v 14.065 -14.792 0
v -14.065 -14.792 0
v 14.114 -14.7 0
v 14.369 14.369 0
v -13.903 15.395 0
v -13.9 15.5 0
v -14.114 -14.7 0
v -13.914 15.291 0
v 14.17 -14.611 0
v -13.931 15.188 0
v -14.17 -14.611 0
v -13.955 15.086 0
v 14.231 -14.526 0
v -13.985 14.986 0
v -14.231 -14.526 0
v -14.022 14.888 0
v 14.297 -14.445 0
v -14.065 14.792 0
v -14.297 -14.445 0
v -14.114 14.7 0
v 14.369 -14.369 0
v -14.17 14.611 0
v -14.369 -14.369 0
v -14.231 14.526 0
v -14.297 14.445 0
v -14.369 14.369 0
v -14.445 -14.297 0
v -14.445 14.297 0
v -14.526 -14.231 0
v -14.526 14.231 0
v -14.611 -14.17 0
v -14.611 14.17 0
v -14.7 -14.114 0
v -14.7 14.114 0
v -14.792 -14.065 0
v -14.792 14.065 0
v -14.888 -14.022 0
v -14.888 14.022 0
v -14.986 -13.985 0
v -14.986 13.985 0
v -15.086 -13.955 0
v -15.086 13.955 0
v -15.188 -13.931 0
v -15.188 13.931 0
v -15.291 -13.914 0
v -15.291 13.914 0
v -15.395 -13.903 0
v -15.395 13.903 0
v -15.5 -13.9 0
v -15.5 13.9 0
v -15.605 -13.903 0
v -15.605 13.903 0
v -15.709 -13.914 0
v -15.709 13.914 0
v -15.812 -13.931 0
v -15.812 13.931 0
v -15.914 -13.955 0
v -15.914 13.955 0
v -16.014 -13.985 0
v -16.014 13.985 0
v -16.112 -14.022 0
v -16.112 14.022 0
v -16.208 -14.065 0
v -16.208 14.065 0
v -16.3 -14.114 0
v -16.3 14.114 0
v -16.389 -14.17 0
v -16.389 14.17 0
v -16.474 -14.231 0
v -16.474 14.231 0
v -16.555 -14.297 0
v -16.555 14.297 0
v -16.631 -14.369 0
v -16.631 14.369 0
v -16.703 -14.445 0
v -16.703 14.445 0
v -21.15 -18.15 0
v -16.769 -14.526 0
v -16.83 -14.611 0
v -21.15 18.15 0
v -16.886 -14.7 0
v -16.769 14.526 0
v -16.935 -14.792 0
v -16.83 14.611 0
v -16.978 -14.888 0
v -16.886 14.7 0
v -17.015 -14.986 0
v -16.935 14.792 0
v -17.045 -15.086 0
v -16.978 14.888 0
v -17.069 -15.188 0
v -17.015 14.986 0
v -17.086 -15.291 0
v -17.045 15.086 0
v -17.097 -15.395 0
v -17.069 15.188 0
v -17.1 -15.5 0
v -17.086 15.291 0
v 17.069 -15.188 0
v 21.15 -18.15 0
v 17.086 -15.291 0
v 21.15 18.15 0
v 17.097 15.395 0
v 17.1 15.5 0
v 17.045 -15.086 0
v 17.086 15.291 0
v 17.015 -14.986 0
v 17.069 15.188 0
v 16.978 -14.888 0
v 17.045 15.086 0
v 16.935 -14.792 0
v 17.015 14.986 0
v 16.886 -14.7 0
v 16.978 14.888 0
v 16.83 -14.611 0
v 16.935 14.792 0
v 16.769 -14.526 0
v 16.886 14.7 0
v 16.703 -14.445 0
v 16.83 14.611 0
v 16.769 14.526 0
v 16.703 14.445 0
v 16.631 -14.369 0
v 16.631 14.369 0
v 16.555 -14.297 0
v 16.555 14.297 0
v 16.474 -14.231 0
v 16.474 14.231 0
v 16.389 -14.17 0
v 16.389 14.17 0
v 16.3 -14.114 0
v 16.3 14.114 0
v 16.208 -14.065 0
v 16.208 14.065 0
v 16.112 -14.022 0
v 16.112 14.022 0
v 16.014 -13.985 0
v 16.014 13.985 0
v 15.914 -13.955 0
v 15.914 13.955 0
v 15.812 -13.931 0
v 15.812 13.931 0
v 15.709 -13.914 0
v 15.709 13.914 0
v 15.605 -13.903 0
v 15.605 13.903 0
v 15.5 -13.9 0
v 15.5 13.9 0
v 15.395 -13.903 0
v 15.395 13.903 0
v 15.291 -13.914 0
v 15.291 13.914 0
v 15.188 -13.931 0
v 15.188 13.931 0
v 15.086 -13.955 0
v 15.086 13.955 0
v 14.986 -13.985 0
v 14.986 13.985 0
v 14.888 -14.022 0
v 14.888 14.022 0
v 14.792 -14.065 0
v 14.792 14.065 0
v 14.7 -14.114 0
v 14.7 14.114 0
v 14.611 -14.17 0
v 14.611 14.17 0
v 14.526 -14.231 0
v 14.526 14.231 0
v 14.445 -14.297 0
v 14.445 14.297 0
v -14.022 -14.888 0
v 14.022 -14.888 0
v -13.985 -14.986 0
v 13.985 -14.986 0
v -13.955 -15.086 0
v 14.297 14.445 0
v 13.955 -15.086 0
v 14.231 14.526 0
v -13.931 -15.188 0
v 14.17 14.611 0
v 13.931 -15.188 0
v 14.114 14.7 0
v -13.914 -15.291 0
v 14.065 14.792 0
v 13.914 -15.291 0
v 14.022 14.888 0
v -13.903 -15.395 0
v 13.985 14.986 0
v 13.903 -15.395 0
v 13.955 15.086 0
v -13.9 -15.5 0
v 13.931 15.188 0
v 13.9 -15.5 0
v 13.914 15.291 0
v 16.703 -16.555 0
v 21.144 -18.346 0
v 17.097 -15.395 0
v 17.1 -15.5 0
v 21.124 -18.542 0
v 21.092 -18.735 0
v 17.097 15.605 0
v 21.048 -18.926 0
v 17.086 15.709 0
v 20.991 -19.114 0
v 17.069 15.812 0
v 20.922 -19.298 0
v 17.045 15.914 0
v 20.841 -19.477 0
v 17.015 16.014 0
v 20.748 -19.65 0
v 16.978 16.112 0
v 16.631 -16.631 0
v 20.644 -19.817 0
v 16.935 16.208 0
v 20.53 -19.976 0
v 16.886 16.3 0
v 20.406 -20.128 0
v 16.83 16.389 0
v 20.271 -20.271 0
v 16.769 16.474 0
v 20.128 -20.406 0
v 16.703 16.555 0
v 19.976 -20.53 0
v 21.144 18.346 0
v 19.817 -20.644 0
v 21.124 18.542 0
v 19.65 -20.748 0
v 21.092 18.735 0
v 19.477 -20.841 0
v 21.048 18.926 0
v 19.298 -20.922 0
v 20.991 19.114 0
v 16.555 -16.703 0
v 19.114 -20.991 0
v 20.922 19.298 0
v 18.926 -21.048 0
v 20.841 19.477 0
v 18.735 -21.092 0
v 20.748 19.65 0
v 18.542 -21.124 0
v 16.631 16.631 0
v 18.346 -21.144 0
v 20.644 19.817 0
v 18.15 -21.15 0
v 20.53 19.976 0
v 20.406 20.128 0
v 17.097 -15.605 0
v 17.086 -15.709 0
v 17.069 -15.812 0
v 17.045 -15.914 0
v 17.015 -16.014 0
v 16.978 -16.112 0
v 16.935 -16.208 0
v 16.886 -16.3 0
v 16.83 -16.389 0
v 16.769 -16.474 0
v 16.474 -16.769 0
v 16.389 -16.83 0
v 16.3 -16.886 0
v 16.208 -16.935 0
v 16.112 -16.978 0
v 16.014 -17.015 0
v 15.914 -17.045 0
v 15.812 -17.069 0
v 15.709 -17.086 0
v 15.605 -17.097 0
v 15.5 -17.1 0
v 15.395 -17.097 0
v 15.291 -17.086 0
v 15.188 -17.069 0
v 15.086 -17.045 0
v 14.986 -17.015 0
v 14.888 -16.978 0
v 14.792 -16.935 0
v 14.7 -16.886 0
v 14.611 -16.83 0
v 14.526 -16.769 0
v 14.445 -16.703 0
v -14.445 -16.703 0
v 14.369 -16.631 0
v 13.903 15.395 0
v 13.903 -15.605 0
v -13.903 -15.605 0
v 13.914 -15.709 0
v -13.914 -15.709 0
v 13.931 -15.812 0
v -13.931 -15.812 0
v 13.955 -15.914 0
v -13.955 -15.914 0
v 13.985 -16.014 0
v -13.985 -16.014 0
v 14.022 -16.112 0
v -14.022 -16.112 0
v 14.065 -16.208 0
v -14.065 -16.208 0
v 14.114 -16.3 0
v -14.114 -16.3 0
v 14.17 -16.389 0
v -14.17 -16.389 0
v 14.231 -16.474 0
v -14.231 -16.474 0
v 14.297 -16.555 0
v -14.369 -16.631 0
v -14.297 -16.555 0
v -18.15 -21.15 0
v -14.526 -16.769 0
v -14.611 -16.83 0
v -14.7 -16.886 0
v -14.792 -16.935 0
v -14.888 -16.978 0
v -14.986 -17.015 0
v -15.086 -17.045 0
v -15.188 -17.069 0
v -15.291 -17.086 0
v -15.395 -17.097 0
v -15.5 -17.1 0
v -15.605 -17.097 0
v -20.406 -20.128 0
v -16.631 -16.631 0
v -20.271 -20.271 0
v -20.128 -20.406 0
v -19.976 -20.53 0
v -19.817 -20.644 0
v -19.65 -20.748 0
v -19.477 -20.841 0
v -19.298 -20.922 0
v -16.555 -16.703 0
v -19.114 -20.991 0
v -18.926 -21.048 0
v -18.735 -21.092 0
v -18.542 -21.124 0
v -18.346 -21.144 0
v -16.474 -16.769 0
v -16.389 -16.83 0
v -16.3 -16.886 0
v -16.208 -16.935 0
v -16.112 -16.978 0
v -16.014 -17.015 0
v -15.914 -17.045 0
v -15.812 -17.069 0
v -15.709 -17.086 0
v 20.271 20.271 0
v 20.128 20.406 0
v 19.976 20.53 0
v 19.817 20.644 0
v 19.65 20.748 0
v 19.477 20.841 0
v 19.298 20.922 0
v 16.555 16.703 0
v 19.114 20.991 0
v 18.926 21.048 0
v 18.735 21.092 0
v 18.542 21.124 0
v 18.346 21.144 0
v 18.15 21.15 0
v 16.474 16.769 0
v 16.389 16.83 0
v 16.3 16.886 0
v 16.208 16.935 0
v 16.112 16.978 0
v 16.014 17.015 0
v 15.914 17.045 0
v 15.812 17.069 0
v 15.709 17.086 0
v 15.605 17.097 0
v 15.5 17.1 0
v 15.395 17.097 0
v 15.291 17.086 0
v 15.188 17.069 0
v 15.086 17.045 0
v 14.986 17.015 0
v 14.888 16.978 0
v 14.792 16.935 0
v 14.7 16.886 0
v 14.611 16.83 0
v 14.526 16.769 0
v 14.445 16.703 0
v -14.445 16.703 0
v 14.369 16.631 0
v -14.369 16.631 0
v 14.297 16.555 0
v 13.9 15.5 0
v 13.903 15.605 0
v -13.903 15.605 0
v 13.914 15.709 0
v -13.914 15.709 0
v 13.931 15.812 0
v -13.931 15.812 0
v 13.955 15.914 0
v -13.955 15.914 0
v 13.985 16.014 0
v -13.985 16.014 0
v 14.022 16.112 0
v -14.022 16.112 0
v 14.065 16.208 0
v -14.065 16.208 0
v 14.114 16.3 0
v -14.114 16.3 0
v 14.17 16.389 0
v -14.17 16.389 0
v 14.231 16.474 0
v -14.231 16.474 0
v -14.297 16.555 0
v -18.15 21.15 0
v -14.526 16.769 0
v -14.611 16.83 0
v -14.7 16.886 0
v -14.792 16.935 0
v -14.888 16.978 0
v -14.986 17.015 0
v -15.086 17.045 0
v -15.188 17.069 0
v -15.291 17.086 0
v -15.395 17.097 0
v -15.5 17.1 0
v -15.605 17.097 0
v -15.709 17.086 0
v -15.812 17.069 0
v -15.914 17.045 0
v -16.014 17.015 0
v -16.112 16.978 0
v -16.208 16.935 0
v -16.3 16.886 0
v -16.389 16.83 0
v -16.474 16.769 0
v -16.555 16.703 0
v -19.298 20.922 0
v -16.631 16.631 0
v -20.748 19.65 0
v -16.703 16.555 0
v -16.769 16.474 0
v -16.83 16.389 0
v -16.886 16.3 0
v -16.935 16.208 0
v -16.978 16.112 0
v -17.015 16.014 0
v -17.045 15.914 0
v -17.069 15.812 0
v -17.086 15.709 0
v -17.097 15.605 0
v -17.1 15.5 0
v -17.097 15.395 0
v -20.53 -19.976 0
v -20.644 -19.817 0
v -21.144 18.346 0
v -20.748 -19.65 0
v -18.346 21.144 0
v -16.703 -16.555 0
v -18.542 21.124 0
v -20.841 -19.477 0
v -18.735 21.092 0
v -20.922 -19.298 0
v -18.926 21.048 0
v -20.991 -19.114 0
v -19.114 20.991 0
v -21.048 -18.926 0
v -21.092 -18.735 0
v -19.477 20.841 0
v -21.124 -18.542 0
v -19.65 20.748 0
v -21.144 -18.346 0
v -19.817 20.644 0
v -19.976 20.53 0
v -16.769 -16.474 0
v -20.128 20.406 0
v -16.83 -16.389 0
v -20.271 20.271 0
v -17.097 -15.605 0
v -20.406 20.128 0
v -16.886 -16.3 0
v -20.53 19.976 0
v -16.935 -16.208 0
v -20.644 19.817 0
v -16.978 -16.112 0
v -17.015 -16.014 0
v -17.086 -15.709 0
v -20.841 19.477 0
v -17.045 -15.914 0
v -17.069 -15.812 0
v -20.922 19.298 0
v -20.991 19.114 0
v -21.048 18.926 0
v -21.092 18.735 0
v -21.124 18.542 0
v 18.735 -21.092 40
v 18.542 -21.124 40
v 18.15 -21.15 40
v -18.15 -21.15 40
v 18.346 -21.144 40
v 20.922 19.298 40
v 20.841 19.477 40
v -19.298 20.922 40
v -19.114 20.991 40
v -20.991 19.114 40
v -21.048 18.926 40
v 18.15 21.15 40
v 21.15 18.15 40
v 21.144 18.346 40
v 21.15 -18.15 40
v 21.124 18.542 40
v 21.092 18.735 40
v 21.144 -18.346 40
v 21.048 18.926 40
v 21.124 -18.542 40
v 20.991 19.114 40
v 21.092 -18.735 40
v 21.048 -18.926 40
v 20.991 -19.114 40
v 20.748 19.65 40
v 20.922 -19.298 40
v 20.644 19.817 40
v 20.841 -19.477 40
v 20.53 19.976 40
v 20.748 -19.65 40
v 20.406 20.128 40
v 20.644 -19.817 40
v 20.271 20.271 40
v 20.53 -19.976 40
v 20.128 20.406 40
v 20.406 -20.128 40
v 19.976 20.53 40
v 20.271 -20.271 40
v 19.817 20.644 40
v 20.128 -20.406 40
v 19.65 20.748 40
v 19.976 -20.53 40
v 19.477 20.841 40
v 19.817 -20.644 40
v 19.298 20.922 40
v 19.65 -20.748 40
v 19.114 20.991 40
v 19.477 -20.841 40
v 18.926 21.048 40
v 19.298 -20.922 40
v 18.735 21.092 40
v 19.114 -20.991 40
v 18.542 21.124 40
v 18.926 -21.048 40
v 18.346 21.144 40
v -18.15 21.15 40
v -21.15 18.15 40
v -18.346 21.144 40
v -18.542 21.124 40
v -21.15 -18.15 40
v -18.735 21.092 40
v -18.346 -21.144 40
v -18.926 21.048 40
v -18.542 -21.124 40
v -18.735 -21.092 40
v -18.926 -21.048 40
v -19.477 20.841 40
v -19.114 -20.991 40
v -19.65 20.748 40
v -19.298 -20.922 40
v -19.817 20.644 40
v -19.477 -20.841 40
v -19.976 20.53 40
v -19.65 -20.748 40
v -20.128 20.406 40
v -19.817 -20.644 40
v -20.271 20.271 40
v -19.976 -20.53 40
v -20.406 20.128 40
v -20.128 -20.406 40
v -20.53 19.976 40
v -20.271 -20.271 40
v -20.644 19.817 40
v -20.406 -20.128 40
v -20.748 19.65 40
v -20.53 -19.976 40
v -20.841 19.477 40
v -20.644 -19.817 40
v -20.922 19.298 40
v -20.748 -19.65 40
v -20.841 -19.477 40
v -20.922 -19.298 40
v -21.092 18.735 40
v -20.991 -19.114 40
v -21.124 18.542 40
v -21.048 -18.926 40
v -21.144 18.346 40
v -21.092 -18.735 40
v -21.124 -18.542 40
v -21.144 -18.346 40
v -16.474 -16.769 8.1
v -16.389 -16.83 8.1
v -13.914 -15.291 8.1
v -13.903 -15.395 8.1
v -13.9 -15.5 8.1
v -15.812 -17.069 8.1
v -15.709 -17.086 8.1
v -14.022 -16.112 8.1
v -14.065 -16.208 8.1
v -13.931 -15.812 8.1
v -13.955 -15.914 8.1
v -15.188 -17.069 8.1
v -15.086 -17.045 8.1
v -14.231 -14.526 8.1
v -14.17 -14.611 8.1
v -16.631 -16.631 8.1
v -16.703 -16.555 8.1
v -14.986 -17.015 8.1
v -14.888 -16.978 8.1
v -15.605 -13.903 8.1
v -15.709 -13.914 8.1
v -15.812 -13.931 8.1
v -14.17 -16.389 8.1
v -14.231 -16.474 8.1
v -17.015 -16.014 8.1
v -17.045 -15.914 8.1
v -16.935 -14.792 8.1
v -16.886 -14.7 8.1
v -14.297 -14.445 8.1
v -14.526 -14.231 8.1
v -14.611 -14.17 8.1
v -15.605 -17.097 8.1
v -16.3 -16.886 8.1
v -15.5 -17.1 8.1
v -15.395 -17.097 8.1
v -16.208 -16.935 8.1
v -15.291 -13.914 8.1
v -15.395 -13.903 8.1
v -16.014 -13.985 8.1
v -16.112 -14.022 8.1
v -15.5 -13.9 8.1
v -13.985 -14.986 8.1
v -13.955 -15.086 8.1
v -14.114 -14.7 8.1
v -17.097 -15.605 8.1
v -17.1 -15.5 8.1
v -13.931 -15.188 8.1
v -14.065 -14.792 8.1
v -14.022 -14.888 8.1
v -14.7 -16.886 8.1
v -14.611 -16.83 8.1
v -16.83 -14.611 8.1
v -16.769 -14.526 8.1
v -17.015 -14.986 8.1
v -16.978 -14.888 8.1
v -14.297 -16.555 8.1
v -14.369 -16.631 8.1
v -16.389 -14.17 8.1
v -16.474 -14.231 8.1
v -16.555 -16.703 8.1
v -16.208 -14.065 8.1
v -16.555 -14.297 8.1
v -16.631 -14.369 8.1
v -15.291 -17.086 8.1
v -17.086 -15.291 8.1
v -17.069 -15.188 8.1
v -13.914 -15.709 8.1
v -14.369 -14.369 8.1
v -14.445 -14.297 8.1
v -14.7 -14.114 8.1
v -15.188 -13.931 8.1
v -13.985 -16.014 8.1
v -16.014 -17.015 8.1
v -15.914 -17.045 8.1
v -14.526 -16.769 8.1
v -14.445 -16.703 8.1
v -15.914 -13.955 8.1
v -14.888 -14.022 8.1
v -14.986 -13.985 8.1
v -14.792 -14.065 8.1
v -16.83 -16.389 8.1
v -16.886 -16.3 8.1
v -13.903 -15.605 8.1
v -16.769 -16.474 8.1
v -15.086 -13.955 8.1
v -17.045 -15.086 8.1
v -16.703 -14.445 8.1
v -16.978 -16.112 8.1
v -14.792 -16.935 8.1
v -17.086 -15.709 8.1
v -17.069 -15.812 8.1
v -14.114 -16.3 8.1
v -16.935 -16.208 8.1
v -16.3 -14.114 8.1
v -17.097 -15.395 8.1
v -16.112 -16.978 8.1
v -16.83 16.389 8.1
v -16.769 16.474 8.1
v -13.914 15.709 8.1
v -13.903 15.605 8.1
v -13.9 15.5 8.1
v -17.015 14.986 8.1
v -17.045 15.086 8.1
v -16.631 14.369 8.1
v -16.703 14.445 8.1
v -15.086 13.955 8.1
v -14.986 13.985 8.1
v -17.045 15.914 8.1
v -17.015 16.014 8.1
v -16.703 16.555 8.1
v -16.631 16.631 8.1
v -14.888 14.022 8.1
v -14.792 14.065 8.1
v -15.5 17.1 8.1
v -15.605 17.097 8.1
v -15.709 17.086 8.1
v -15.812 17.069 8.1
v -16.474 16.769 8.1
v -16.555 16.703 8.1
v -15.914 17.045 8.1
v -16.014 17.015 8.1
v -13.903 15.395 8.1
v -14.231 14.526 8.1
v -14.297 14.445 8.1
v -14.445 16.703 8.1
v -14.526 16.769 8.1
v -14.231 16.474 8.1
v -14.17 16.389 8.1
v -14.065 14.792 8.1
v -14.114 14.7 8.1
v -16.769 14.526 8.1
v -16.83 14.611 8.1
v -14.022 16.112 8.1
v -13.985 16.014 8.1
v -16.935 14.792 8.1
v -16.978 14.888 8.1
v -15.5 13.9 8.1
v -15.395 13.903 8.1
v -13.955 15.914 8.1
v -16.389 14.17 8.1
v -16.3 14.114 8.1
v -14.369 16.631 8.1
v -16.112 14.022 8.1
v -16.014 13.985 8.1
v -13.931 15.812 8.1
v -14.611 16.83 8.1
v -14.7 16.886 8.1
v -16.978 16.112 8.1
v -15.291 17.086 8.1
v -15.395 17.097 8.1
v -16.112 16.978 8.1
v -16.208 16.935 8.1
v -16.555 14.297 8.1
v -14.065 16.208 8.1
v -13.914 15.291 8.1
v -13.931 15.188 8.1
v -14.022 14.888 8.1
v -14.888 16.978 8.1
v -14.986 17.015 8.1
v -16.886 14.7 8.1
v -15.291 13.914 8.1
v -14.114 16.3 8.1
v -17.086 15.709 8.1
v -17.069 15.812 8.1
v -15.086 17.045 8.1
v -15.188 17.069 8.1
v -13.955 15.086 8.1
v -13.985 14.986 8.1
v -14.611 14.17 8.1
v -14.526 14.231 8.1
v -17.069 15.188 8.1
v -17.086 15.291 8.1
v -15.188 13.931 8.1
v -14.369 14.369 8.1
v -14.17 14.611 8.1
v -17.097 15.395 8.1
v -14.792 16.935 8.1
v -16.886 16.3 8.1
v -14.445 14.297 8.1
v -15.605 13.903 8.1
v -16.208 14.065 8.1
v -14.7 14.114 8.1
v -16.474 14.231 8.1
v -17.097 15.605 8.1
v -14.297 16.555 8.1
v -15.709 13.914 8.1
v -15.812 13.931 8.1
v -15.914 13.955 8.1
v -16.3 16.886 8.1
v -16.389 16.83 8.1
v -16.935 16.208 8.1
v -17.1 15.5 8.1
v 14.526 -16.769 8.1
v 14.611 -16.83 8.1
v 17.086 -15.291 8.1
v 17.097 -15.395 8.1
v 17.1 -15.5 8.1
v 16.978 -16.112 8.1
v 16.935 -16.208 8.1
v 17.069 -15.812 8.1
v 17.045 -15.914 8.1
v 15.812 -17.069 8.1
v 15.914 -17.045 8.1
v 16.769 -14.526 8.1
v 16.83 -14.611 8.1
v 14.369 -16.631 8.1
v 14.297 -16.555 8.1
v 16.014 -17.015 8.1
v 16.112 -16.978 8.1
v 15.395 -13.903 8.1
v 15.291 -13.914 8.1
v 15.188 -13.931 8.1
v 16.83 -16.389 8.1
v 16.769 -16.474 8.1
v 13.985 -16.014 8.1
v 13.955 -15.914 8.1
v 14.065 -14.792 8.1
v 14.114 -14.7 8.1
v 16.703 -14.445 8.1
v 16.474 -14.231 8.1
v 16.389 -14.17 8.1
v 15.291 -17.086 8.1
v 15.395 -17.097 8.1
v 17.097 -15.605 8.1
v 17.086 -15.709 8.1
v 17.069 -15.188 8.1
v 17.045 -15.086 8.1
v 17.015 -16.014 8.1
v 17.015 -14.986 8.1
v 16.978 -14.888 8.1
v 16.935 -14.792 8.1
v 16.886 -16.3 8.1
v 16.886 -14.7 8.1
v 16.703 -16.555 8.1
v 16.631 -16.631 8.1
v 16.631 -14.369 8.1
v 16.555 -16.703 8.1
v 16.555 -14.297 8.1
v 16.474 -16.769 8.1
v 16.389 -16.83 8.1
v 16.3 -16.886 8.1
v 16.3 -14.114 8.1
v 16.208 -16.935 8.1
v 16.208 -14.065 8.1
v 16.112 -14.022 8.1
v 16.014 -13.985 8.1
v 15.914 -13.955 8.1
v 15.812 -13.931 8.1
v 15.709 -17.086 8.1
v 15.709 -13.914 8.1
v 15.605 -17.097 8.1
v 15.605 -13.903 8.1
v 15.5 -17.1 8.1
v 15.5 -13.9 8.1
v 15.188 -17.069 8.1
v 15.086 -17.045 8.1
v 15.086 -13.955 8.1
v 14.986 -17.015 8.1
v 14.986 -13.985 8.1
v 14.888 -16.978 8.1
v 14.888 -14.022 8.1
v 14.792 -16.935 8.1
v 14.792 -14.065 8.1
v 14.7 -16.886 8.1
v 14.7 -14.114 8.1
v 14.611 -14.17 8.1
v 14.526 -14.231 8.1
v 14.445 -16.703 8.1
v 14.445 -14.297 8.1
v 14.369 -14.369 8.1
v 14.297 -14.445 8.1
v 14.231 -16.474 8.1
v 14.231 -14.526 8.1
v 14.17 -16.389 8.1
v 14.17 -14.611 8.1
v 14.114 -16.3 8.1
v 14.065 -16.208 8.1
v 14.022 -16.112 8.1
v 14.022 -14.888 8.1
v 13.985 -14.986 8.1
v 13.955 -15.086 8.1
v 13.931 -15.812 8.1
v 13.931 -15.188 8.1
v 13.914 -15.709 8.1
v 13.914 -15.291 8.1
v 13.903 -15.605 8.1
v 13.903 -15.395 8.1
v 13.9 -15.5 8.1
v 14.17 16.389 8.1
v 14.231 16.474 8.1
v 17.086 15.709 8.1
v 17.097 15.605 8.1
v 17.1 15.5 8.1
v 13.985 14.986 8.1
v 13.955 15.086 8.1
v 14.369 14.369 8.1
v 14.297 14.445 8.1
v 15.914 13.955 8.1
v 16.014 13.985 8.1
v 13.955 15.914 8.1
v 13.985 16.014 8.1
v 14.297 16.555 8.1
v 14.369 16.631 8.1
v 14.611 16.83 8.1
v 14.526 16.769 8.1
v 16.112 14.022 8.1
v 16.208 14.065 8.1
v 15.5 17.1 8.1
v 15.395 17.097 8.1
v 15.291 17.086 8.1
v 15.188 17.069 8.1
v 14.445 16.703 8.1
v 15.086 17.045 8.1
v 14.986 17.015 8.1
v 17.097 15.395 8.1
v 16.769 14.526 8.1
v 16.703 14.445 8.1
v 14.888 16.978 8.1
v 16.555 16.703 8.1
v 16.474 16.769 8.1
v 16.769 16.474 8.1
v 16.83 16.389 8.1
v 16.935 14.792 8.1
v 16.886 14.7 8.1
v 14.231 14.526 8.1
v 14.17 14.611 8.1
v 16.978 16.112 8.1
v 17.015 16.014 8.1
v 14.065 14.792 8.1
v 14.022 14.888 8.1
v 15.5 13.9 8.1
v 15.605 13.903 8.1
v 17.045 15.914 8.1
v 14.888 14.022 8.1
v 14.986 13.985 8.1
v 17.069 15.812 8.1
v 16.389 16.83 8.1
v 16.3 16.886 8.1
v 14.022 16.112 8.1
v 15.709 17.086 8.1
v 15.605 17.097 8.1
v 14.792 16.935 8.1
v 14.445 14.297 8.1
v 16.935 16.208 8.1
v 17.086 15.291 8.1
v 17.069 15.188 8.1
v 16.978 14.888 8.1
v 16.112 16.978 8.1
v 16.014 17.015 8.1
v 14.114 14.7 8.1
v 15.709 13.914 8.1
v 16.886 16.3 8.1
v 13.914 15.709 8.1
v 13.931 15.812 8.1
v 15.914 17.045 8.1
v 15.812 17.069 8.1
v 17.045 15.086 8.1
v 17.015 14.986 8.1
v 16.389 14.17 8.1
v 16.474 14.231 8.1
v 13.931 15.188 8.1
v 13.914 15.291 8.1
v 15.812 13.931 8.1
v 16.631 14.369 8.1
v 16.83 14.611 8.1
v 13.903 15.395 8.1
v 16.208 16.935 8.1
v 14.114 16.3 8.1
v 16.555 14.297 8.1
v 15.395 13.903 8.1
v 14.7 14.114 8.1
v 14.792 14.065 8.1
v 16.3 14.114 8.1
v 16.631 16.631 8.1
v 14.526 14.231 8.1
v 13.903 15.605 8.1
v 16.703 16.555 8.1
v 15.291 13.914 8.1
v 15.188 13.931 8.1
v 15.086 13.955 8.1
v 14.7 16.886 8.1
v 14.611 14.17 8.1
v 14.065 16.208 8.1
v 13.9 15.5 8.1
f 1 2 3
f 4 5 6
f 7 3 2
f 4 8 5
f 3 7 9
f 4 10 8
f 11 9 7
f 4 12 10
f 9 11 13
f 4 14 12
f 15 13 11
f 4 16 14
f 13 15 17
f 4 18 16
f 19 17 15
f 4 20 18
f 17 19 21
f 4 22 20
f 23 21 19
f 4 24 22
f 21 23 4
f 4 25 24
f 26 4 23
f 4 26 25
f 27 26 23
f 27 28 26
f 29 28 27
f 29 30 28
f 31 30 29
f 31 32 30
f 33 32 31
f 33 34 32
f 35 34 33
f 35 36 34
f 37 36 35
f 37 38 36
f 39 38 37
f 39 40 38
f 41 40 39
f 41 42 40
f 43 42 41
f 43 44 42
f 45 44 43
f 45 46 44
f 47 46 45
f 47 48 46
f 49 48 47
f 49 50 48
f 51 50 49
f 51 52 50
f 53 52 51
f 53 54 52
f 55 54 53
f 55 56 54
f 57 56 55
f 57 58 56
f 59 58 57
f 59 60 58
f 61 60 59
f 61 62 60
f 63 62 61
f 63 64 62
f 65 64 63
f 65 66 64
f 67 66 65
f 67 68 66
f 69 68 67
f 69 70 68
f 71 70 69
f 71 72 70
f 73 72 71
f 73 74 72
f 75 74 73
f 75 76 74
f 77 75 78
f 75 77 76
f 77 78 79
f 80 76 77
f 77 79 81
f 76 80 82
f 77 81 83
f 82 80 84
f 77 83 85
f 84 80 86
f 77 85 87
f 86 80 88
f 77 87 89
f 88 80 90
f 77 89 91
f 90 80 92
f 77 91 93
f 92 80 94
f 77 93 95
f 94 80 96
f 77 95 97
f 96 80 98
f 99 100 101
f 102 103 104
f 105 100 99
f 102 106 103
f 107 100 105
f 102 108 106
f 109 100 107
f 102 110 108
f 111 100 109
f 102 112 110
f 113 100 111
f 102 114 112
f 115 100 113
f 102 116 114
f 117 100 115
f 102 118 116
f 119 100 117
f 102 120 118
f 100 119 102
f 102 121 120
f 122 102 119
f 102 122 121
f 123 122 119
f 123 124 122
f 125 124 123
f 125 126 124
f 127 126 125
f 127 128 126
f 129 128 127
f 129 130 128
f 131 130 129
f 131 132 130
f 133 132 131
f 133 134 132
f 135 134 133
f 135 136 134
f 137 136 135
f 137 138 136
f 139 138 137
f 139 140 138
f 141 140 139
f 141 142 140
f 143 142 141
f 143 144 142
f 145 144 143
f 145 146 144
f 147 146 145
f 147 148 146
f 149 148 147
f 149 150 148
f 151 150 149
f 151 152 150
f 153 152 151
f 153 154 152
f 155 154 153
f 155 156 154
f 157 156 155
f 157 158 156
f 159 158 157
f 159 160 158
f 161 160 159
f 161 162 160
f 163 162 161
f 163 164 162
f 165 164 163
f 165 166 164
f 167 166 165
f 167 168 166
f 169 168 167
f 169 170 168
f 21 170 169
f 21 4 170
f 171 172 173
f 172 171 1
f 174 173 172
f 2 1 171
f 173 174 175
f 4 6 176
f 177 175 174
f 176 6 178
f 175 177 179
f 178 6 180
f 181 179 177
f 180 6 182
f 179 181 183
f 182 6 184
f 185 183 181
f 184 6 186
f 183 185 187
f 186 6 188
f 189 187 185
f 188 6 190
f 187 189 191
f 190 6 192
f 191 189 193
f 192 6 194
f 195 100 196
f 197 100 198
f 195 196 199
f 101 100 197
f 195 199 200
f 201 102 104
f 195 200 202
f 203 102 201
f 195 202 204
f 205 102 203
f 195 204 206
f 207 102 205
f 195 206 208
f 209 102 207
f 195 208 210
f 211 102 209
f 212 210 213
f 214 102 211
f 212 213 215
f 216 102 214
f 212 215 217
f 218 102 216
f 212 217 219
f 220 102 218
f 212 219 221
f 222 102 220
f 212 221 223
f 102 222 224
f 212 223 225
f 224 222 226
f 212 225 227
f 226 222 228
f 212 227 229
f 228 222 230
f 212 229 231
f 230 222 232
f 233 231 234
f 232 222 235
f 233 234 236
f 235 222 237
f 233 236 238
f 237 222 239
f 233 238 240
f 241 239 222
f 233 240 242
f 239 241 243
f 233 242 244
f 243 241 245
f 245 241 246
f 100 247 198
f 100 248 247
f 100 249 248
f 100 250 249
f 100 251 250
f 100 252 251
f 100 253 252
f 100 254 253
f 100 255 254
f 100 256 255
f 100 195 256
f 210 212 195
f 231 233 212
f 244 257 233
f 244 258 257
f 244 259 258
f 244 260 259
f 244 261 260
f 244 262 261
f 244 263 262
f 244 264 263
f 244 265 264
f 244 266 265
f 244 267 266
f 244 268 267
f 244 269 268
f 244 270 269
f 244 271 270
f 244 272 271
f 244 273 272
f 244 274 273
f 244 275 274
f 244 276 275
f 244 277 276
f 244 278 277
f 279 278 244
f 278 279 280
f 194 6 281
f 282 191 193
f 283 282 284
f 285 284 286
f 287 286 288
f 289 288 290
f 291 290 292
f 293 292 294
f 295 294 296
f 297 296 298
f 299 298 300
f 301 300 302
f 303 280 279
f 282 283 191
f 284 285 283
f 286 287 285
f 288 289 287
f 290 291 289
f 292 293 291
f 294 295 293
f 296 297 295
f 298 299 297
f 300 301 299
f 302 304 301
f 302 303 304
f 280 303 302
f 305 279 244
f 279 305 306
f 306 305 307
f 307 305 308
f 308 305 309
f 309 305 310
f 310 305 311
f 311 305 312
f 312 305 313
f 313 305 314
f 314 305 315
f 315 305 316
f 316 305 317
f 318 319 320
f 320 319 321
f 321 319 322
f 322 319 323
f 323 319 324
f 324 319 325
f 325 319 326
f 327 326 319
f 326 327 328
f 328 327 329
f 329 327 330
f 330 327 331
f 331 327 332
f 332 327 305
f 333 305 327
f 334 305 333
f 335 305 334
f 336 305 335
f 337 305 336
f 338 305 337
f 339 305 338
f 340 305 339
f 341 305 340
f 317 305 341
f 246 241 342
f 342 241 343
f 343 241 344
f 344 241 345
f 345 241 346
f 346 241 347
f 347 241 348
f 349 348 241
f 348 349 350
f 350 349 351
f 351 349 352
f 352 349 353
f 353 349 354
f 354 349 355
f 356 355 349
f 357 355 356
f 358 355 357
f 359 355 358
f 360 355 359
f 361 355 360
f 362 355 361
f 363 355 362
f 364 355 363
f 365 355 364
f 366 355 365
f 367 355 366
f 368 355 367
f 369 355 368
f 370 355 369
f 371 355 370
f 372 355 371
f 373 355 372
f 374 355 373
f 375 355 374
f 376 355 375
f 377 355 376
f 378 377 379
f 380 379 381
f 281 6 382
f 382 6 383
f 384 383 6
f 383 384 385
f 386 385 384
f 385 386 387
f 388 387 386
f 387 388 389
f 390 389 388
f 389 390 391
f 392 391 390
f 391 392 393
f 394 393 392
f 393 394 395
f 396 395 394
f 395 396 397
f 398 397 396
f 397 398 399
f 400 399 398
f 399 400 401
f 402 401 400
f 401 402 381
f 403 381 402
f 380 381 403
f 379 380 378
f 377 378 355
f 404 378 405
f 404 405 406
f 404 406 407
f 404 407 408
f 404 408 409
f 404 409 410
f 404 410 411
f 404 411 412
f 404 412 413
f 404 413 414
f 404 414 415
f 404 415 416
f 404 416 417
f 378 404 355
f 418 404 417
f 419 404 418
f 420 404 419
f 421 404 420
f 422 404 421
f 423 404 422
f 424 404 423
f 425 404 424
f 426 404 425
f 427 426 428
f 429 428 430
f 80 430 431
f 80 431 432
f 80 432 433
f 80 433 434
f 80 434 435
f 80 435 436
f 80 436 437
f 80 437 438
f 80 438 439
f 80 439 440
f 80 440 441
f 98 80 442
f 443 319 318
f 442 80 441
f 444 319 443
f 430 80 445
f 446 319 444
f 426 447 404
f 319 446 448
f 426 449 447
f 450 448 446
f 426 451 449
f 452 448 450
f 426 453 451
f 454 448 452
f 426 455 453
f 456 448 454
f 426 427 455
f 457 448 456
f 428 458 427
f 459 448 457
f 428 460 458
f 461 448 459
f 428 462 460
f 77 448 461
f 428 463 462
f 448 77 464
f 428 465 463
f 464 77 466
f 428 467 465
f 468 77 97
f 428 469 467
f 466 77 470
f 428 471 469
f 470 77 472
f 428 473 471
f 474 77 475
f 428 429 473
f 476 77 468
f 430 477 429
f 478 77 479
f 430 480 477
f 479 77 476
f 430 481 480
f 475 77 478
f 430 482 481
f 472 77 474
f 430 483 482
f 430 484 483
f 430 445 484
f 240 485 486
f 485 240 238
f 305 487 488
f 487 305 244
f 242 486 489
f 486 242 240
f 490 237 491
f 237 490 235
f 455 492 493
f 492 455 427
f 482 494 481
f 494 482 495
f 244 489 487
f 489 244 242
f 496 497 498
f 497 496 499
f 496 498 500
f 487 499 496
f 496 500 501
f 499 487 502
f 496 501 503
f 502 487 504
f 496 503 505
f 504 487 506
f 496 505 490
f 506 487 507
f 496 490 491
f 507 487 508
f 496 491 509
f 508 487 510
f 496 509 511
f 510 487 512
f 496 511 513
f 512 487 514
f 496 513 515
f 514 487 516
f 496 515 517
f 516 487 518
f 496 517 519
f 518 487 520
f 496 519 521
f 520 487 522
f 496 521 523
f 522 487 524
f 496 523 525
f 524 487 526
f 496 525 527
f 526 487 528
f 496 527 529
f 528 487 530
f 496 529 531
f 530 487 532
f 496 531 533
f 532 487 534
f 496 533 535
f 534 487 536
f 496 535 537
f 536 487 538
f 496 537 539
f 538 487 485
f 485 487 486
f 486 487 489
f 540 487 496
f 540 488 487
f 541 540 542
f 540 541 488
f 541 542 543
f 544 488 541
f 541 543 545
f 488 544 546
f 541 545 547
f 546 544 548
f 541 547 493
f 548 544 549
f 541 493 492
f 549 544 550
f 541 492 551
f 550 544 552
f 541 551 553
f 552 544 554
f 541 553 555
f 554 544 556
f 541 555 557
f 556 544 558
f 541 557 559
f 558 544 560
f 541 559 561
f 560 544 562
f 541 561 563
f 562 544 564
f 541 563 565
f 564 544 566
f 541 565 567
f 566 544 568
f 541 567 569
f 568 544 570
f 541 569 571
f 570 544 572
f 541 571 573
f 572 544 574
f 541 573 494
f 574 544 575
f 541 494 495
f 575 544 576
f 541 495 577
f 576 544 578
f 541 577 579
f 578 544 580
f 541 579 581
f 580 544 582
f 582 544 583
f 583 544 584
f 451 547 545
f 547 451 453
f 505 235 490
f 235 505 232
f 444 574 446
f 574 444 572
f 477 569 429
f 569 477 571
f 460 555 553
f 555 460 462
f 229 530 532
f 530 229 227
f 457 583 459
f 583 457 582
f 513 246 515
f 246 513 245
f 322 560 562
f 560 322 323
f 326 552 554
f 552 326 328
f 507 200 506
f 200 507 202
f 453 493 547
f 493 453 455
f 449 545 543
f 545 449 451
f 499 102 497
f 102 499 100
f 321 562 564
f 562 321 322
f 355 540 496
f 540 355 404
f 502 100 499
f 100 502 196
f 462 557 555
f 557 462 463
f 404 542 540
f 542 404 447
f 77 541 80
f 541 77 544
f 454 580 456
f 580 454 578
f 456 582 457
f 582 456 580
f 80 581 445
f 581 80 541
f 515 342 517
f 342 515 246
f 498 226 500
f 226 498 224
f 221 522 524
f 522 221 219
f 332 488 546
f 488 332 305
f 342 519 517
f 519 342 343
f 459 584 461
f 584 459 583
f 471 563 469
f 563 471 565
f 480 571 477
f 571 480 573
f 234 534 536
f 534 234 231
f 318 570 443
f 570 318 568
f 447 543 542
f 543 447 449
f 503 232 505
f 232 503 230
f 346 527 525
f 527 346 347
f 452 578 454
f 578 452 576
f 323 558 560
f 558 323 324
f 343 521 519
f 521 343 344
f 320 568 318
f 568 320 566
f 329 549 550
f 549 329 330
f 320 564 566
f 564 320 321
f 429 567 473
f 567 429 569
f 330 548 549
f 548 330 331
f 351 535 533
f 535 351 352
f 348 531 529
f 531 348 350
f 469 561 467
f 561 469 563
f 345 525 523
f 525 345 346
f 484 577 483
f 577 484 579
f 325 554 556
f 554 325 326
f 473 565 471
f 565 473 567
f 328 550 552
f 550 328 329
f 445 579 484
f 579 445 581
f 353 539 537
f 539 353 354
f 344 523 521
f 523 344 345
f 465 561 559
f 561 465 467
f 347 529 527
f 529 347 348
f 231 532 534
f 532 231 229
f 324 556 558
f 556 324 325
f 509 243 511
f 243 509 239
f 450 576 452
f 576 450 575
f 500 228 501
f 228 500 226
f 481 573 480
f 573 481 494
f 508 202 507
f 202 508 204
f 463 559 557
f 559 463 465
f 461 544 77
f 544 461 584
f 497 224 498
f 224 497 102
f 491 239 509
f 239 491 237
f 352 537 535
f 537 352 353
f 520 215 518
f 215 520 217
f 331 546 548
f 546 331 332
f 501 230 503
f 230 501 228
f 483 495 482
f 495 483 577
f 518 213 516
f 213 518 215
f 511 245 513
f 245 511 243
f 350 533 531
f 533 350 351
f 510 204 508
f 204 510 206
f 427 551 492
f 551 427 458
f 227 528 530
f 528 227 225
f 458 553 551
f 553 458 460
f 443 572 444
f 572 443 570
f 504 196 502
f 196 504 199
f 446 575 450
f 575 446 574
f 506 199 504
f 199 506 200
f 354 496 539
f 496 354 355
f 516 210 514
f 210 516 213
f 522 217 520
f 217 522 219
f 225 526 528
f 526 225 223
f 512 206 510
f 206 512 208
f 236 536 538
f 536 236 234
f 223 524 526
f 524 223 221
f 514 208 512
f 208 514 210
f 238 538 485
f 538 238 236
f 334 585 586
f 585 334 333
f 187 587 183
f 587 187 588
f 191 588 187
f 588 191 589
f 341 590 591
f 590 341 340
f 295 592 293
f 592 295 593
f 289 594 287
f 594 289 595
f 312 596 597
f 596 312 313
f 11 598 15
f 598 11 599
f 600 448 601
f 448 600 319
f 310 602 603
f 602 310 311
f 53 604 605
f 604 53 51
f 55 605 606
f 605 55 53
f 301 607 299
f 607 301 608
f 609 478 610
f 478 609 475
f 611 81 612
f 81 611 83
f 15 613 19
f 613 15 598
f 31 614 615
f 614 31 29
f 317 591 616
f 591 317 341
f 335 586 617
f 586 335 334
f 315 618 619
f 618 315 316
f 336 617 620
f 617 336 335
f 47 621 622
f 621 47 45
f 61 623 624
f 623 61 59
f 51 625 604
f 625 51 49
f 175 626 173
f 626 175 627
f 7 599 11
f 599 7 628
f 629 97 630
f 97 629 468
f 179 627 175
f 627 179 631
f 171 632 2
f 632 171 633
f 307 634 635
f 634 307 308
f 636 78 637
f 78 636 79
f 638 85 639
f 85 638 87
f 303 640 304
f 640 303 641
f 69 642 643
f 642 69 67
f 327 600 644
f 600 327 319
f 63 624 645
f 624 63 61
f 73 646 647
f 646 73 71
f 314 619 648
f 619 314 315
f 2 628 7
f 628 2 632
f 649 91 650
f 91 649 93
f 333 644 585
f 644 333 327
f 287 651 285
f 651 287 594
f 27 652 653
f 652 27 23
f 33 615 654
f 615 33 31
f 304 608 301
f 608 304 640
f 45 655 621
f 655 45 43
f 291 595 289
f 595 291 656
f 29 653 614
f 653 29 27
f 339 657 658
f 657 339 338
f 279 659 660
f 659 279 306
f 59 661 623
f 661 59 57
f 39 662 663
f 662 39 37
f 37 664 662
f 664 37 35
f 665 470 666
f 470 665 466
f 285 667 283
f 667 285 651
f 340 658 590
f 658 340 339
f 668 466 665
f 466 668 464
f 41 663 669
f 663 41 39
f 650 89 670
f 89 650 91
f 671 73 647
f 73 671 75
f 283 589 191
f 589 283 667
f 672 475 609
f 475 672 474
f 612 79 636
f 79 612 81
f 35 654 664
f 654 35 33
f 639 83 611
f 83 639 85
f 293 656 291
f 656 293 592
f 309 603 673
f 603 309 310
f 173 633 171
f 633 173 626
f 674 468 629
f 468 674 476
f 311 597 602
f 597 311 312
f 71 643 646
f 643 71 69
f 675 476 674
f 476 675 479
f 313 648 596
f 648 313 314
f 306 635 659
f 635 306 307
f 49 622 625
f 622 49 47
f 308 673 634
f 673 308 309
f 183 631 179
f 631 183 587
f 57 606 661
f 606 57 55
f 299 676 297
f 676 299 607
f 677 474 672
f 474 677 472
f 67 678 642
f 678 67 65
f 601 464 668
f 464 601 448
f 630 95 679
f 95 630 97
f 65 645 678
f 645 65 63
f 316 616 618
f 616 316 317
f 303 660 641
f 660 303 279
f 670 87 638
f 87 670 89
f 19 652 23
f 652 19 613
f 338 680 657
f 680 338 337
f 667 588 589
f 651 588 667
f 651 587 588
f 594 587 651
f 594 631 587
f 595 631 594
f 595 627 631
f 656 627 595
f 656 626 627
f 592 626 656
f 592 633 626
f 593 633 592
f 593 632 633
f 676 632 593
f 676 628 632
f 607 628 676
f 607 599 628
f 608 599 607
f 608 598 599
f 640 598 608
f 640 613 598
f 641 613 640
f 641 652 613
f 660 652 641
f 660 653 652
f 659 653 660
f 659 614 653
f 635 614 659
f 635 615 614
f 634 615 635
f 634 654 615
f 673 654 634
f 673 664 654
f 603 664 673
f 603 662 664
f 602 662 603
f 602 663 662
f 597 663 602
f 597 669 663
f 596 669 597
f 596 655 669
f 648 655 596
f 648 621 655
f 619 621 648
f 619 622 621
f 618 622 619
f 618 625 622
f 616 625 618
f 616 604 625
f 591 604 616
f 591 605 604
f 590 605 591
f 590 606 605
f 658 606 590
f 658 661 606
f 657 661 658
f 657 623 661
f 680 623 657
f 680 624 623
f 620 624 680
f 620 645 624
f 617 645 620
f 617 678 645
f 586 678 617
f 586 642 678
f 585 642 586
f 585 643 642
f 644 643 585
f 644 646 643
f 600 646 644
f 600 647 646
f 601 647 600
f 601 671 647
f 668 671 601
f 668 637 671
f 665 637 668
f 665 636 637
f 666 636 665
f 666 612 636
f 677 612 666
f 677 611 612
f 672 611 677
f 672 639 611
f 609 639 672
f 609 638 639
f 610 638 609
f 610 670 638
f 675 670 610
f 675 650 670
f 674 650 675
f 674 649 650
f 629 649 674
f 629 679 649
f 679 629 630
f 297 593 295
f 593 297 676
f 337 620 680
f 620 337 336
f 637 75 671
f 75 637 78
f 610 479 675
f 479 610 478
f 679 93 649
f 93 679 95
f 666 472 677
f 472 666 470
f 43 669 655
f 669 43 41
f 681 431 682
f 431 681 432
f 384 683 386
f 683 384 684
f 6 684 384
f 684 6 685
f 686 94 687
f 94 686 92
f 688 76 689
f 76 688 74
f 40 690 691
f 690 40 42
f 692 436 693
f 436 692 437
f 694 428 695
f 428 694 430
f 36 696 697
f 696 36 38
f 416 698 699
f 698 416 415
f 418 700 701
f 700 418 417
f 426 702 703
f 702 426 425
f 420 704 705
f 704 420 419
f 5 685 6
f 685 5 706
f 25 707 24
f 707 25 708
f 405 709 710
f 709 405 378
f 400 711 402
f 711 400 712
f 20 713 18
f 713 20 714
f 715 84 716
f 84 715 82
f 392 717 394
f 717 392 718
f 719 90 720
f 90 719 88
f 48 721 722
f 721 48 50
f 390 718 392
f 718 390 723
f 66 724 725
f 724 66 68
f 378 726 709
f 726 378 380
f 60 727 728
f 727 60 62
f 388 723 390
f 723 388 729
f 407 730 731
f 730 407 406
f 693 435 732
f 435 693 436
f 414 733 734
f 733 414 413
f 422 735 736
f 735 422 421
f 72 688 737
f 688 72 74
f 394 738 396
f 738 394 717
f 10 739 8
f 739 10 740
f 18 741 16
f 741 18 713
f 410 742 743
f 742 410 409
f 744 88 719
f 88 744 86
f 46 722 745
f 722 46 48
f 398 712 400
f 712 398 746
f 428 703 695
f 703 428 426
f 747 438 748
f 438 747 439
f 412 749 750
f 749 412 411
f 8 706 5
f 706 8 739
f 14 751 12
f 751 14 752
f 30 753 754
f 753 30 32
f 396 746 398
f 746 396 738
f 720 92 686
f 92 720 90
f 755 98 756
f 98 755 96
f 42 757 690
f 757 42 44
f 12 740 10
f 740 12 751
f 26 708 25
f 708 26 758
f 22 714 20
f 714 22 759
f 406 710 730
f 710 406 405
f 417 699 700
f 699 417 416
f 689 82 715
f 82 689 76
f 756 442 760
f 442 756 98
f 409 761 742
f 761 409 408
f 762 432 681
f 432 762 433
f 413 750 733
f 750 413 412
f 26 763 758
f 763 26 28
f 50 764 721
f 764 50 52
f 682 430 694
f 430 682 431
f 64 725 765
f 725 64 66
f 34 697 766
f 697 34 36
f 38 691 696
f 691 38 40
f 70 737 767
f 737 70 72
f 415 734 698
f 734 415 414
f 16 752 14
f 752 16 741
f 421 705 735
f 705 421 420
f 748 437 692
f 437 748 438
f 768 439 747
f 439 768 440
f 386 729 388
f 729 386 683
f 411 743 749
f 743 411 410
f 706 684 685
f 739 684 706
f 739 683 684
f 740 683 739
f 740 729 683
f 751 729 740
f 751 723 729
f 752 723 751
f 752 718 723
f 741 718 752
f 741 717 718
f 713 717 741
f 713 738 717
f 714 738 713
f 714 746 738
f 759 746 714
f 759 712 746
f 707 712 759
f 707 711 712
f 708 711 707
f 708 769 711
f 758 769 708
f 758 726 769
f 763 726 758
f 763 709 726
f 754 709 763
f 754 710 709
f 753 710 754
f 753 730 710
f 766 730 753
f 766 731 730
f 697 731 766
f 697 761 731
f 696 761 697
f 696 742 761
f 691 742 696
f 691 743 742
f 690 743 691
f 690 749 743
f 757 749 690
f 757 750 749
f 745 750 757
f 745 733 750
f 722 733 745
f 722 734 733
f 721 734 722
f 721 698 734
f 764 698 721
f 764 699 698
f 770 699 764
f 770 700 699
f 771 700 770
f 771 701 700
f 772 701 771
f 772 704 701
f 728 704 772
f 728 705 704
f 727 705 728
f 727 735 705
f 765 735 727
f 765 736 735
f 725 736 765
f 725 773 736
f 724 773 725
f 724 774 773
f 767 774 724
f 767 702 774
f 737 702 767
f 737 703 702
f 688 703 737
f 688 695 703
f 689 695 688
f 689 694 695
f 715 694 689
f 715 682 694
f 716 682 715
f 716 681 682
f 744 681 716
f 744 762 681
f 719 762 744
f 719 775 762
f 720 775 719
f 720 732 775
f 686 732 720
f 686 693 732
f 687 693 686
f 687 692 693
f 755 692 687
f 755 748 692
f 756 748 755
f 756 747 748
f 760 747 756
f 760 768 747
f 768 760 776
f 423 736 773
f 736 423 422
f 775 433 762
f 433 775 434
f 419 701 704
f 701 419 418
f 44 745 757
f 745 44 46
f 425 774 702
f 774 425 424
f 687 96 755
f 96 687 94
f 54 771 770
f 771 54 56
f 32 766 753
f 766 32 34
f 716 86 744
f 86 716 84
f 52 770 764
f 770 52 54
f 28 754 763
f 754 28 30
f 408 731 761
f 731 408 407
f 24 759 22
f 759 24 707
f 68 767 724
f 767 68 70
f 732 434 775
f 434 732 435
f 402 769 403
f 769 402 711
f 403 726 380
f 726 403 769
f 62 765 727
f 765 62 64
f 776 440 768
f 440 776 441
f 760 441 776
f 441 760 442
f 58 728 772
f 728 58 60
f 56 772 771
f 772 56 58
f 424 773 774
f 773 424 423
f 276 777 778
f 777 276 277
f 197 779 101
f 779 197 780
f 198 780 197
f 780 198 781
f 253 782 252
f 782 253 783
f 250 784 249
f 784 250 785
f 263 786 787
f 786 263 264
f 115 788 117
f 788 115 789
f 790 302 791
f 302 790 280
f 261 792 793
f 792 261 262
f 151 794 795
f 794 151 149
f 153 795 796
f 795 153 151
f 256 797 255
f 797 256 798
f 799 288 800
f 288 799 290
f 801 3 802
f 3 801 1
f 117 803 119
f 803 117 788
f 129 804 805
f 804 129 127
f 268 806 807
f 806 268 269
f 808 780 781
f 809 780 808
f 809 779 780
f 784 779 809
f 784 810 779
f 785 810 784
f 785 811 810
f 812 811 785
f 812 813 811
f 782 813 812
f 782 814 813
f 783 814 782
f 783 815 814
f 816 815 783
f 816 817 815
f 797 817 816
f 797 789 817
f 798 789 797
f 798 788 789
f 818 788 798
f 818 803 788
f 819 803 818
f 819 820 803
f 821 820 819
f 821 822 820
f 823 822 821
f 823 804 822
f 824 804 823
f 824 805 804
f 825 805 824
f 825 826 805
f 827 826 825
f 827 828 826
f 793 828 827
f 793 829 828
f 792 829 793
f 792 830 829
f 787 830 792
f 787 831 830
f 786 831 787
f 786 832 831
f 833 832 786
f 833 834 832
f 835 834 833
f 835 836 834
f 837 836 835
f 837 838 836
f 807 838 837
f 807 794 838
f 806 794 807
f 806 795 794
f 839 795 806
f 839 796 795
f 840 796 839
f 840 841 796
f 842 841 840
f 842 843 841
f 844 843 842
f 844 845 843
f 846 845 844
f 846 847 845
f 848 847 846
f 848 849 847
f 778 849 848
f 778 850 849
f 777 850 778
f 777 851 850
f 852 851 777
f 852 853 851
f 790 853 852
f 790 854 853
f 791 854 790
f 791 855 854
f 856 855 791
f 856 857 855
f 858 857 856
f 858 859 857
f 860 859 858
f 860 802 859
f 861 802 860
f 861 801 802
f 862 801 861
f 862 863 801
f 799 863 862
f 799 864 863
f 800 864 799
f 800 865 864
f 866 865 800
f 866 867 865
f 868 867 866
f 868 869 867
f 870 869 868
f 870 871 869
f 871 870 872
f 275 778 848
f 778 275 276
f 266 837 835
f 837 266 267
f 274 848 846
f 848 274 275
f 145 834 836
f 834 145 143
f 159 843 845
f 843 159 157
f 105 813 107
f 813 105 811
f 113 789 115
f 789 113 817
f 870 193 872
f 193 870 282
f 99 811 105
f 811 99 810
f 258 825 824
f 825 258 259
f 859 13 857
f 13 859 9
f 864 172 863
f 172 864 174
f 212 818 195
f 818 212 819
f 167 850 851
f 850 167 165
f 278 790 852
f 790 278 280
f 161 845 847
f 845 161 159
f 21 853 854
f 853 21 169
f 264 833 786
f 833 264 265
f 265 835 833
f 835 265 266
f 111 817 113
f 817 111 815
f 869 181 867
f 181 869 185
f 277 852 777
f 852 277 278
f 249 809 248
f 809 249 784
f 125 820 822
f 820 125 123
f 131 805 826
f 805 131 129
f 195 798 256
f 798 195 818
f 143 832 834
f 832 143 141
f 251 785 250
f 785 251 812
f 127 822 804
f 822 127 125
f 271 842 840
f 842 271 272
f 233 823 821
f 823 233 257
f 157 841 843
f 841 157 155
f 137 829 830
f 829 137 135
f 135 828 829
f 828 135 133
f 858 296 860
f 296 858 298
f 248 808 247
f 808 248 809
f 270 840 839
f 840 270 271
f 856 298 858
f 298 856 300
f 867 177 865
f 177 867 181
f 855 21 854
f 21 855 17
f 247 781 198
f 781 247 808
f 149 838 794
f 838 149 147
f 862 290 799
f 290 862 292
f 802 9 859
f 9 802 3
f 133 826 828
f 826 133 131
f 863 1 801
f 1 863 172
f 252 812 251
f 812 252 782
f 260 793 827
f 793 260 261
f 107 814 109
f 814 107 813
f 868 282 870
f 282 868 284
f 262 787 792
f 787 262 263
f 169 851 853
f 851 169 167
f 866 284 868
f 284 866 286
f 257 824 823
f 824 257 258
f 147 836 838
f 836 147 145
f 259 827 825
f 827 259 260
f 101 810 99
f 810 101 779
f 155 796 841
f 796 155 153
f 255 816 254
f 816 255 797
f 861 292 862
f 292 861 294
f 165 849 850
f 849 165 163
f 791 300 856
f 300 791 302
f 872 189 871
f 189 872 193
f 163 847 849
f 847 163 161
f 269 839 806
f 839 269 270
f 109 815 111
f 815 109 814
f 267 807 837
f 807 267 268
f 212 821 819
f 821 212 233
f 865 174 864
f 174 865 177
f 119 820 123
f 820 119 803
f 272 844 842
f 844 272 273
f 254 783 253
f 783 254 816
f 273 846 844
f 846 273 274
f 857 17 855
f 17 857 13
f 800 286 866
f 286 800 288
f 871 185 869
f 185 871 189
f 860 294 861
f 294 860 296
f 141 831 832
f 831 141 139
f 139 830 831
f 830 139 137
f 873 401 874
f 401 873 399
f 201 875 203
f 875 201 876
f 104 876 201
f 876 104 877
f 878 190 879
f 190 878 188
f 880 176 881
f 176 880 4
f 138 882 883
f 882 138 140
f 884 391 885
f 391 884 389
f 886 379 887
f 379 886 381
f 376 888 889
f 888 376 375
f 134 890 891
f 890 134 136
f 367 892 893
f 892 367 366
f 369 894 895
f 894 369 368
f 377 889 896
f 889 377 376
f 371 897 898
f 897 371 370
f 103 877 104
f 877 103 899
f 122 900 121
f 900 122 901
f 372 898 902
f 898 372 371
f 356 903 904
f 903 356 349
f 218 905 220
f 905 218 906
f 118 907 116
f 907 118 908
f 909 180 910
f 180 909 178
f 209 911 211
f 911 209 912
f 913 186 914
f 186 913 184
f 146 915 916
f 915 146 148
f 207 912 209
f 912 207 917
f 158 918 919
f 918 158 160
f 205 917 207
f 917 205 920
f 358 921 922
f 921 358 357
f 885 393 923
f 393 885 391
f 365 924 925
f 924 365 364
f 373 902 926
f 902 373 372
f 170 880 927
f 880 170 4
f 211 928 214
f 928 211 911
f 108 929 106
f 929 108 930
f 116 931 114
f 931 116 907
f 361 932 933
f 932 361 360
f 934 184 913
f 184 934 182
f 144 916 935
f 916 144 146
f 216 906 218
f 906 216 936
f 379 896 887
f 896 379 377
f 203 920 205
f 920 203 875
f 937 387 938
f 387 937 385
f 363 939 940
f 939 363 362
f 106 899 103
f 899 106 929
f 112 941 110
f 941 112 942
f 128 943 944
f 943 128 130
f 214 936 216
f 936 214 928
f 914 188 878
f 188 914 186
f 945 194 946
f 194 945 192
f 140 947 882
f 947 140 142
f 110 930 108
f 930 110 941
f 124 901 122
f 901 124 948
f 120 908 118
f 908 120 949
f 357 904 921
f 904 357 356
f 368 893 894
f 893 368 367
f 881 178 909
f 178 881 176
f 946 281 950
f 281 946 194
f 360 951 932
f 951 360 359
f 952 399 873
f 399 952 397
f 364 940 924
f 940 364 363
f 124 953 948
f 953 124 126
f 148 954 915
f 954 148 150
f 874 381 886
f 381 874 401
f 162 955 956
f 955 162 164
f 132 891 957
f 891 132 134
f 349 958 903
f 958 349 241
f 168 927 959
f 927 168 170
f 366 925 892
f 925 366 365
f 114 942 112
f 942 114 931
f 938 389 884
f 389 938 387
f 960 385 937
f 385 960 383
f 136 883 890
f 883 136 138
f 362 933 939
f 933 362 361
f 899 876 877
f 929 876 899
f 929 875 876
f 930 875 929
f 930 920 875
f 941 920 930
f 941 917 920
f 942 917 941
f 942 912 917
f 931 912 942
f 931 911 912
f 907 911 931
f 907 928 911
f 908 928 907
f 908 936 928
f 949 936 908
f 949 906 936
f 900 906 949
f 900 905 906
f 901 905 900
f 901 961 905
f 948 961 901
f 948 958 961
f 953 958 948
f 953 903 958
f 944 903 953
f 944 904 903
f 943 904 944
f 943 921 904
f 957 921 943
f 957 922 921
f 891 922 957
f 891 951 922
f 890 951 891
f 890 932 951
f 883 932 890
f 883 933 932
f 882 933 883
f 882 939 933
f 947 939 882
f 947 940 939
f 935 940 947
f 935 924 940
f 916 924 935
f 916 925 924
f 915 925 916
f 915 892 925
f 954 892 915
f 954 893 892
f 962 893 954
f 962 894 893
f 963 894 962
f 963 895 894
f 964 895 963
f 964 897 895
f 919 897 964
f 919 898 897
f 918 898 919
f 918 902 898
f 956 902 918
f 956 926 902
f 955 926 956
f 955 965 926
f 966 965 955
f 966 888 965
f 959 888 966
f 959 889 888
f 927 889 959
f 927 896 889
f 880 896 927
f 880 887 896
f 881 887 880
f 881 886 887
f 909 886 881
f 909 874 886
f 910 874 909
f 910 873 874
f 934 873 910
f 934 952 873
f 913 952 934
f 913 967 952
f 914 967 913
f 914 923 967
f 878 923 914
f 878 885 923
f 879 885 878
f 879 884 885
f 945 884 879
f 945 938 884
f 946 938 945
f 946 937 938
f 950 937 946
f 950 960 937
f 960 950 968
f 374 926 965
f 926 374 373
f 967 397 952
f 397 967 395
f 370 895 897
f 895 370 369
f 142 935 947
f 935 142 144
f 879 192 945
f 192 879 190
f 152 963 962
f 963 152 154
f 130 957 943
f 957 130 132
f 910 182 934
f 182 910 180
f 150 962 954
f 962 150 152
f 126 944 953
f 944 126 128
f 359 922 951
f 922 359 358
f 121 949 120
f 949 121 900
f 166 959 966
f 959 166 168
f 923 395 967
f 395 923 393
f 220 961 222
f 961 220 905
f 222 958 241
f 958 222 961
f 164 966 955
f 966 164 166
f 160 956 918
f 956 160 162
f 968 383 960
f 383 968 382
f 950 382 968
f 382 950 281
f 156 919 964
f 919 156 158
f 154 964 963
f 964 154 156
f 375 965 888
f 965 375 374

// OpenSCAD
$fn = 96;

// Parameters (mm)
face_w = 42.3;          // motor face width (square)
body_len = 40.0;        // motor body length (excluding front boss/shaft)
shaft_d = 5.0;          // shaft diameter
shaft_len = 22.0;       // typical protrusion
mount_spacing = 31.0;   // mounting hole spacing (center-to-center)
mount_hole_d = 3.2;     // typical for M3 clearance
front_boss_d = 22.0;    // typical NEMA17 pilot diameter
front_boss_h = 2.0;     // typical pilot height
corner_r = 3.0;         // body corner radius (approx)
face_plate_th = 2.0;    // front face plate thickness (visual)
back_cap_th = 1.5;      // back cap thickness (visual)

module rounded_square_prism(w, h, r, center=false) {
    // 2D rounded square via offset, then linear_extrude
    linear_extrude(height=h, center=center)
        offset(r=r)
            square([w-2*r, w-2*r], center=true);
}

module stepper_motor() {
    // Body (rounded square)
    color([0.25,0.25,0.27])
    translate([0,0,0])
    rounded_square_prism(face_w, body_len, corner_r, center=false);

    // Front face plate (slightly different shade)
    color([0.18,0.18,0.20])
    translate([0,0,0])
    linear_extrude(height=face_plate_th)
        offset(r=corner_r)
            square([face_w-2*corner_r, face_w-2*corner_r], center=true);

    // Back cap
    color([0.18,0.18,0.20])
    translate([0,0,body_len-back_cap_th])
    linear_extrude(height=back_cap_th)
        offset(r=corner_r)
            square([face_w-2*corner_r, face_w-2*corner_r], center=true);

    // Front boss (pilot)
    color([0.65,0.65,0.68])
    translate([0,0,face_plate_th])
    cylinder(d=front_boss_d, h=front_boss_h);

    // Shaft
    color([0.75,0.75,0.78])
    translate([0,0,face_plate_th+front_boss_h])
    cylinder(d=shaft_d, h=shaft_len);

    // Mounting holes (through front plate into body for visualization)
    // NEMA17 holes are typically on a 31mm square pattern.
    hole_depth = face_plate_th + 6; // shallow holes for appearance
    for (sx = [-1,1], sy = [-1,1]) {
        translate([sx*mount_spacing/2, sy*mount_spacing/2, 0])
        color([0.05,0.05,0.05])
        cylinder(d=mount_hole_d, h=hole_depth);
    }
}

difference() {
    stepper_motor();

    // Actually subtract the mounting holes from the body/face
    hole_depth = face_plate_th + 6;
    for (sx = [-1,1], sy = [-1,1]) {
        translate([sx*mount_spacing/2, sy*mount_spacing/2, -0.1])
            cylinder(d=mount_hole_d, h=hole_depth+0.2);
    }
}
